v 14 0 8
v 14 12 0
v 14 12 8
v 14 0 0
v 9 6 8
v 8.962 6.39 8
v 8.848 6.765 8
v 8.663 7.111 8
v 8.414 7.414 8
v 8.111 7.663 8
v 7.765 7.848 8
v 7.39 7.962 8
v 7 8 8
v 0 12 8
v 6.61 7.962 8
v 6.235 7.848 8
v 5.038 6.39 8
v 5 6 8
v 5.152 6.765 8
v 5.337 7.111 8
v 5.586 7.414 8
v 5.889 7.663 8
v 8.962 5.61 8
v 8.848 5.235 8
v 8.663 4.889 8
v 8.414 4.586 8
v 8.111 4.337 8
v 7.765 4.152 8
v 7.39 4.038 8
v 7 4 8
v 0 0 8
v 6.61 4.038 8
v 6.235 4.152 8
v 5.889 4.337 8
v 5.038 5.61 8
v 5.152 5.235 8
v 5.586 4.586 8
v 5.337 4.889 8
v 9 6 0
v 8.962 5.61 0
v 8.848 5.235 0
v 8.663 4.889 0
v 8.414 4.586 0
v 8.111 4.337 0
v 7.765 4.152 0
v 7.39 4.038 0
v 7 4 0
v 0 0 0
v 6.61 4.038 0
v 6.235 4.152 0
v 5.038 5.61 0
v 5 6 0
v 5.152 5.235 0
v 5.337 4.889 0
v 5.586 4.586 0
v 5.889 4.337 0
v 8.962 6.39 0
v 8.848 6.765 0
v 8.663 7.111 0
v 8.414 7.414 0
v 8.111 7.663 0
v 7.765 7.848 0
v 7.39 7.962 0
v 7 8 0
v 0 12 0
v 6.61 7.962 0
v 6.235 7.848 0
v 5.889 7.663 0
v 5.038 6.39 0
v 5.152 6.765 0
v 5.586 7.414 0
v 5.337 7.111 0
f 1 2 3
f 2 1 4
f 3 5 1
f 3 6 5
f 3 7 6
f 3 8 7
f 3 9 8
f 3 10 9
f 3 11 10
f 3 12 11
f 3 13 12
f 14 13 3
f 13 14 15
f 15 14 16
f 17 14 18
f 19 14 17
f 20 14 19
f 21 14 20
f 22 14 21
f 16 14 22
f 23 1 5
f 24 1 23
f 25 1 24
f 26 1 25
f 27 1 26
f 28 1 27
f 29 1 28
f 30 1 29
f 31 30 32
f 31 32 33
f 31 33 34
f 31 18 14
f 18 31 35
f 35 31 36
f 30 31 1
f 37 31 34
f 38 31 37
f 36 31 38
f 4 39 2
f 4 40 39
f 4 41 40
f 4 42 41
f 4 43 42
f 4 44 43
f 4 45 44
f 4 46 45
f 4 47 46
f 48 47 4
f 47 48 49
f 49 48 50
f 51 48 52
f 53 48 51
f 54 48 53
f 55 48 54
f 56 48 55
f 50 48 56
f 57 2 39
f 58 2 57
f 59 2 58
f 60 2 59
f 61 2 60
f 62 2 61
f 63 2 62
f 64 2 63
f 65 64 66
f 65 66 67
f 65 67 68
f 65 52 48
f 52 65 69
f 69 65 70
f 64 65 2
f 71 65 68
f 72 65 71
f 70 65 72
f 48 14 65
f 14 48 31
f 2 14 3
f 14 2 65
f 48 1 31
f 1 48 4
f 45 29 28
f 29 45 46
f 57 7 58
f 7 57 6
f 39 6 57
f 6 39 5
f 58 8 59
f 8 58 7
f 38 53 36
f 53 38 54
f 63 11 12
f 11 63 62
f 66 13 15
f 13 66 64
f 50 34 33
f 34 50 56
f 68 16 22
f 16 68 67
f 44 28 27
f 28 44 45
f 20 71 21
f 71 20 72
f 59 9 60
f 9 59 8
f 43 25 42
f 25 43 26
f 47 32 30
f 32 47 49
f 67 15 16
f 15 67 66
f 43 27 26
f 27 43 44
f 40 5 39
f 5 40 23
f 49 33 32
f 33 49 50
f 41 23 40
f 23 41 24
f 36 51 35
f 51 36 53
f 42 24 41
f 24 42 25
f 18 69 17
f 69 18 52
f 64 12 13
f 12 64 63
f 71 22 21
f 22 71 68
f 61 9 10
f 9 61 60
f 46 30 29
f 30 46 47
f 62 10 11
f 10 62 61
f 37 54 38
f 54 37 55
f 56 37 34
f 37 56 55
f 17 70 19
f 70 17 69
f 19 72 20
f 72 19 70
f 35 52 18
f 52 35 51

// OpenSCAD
$fn = 32;

// ----------------------------------------------------------------------
// Micro pad: drilled pad, 5-20 mm class
// ----------------------------------------------------------------------

// --- parameters (mm) ---
pad_l = 14;               // pad length, X
pad_w = 12;               // pad width, Y
pad_t = 8;                // pad thickness, Z
hole_d = 4;               // through hole diameter

difference() {
  cube([pad_l, pad_w, pad_t]);
  translate([pad_l / 2, pad_w / 2, -1])
    cylinder(h = pad_t + 2, d = hole_d);
}
